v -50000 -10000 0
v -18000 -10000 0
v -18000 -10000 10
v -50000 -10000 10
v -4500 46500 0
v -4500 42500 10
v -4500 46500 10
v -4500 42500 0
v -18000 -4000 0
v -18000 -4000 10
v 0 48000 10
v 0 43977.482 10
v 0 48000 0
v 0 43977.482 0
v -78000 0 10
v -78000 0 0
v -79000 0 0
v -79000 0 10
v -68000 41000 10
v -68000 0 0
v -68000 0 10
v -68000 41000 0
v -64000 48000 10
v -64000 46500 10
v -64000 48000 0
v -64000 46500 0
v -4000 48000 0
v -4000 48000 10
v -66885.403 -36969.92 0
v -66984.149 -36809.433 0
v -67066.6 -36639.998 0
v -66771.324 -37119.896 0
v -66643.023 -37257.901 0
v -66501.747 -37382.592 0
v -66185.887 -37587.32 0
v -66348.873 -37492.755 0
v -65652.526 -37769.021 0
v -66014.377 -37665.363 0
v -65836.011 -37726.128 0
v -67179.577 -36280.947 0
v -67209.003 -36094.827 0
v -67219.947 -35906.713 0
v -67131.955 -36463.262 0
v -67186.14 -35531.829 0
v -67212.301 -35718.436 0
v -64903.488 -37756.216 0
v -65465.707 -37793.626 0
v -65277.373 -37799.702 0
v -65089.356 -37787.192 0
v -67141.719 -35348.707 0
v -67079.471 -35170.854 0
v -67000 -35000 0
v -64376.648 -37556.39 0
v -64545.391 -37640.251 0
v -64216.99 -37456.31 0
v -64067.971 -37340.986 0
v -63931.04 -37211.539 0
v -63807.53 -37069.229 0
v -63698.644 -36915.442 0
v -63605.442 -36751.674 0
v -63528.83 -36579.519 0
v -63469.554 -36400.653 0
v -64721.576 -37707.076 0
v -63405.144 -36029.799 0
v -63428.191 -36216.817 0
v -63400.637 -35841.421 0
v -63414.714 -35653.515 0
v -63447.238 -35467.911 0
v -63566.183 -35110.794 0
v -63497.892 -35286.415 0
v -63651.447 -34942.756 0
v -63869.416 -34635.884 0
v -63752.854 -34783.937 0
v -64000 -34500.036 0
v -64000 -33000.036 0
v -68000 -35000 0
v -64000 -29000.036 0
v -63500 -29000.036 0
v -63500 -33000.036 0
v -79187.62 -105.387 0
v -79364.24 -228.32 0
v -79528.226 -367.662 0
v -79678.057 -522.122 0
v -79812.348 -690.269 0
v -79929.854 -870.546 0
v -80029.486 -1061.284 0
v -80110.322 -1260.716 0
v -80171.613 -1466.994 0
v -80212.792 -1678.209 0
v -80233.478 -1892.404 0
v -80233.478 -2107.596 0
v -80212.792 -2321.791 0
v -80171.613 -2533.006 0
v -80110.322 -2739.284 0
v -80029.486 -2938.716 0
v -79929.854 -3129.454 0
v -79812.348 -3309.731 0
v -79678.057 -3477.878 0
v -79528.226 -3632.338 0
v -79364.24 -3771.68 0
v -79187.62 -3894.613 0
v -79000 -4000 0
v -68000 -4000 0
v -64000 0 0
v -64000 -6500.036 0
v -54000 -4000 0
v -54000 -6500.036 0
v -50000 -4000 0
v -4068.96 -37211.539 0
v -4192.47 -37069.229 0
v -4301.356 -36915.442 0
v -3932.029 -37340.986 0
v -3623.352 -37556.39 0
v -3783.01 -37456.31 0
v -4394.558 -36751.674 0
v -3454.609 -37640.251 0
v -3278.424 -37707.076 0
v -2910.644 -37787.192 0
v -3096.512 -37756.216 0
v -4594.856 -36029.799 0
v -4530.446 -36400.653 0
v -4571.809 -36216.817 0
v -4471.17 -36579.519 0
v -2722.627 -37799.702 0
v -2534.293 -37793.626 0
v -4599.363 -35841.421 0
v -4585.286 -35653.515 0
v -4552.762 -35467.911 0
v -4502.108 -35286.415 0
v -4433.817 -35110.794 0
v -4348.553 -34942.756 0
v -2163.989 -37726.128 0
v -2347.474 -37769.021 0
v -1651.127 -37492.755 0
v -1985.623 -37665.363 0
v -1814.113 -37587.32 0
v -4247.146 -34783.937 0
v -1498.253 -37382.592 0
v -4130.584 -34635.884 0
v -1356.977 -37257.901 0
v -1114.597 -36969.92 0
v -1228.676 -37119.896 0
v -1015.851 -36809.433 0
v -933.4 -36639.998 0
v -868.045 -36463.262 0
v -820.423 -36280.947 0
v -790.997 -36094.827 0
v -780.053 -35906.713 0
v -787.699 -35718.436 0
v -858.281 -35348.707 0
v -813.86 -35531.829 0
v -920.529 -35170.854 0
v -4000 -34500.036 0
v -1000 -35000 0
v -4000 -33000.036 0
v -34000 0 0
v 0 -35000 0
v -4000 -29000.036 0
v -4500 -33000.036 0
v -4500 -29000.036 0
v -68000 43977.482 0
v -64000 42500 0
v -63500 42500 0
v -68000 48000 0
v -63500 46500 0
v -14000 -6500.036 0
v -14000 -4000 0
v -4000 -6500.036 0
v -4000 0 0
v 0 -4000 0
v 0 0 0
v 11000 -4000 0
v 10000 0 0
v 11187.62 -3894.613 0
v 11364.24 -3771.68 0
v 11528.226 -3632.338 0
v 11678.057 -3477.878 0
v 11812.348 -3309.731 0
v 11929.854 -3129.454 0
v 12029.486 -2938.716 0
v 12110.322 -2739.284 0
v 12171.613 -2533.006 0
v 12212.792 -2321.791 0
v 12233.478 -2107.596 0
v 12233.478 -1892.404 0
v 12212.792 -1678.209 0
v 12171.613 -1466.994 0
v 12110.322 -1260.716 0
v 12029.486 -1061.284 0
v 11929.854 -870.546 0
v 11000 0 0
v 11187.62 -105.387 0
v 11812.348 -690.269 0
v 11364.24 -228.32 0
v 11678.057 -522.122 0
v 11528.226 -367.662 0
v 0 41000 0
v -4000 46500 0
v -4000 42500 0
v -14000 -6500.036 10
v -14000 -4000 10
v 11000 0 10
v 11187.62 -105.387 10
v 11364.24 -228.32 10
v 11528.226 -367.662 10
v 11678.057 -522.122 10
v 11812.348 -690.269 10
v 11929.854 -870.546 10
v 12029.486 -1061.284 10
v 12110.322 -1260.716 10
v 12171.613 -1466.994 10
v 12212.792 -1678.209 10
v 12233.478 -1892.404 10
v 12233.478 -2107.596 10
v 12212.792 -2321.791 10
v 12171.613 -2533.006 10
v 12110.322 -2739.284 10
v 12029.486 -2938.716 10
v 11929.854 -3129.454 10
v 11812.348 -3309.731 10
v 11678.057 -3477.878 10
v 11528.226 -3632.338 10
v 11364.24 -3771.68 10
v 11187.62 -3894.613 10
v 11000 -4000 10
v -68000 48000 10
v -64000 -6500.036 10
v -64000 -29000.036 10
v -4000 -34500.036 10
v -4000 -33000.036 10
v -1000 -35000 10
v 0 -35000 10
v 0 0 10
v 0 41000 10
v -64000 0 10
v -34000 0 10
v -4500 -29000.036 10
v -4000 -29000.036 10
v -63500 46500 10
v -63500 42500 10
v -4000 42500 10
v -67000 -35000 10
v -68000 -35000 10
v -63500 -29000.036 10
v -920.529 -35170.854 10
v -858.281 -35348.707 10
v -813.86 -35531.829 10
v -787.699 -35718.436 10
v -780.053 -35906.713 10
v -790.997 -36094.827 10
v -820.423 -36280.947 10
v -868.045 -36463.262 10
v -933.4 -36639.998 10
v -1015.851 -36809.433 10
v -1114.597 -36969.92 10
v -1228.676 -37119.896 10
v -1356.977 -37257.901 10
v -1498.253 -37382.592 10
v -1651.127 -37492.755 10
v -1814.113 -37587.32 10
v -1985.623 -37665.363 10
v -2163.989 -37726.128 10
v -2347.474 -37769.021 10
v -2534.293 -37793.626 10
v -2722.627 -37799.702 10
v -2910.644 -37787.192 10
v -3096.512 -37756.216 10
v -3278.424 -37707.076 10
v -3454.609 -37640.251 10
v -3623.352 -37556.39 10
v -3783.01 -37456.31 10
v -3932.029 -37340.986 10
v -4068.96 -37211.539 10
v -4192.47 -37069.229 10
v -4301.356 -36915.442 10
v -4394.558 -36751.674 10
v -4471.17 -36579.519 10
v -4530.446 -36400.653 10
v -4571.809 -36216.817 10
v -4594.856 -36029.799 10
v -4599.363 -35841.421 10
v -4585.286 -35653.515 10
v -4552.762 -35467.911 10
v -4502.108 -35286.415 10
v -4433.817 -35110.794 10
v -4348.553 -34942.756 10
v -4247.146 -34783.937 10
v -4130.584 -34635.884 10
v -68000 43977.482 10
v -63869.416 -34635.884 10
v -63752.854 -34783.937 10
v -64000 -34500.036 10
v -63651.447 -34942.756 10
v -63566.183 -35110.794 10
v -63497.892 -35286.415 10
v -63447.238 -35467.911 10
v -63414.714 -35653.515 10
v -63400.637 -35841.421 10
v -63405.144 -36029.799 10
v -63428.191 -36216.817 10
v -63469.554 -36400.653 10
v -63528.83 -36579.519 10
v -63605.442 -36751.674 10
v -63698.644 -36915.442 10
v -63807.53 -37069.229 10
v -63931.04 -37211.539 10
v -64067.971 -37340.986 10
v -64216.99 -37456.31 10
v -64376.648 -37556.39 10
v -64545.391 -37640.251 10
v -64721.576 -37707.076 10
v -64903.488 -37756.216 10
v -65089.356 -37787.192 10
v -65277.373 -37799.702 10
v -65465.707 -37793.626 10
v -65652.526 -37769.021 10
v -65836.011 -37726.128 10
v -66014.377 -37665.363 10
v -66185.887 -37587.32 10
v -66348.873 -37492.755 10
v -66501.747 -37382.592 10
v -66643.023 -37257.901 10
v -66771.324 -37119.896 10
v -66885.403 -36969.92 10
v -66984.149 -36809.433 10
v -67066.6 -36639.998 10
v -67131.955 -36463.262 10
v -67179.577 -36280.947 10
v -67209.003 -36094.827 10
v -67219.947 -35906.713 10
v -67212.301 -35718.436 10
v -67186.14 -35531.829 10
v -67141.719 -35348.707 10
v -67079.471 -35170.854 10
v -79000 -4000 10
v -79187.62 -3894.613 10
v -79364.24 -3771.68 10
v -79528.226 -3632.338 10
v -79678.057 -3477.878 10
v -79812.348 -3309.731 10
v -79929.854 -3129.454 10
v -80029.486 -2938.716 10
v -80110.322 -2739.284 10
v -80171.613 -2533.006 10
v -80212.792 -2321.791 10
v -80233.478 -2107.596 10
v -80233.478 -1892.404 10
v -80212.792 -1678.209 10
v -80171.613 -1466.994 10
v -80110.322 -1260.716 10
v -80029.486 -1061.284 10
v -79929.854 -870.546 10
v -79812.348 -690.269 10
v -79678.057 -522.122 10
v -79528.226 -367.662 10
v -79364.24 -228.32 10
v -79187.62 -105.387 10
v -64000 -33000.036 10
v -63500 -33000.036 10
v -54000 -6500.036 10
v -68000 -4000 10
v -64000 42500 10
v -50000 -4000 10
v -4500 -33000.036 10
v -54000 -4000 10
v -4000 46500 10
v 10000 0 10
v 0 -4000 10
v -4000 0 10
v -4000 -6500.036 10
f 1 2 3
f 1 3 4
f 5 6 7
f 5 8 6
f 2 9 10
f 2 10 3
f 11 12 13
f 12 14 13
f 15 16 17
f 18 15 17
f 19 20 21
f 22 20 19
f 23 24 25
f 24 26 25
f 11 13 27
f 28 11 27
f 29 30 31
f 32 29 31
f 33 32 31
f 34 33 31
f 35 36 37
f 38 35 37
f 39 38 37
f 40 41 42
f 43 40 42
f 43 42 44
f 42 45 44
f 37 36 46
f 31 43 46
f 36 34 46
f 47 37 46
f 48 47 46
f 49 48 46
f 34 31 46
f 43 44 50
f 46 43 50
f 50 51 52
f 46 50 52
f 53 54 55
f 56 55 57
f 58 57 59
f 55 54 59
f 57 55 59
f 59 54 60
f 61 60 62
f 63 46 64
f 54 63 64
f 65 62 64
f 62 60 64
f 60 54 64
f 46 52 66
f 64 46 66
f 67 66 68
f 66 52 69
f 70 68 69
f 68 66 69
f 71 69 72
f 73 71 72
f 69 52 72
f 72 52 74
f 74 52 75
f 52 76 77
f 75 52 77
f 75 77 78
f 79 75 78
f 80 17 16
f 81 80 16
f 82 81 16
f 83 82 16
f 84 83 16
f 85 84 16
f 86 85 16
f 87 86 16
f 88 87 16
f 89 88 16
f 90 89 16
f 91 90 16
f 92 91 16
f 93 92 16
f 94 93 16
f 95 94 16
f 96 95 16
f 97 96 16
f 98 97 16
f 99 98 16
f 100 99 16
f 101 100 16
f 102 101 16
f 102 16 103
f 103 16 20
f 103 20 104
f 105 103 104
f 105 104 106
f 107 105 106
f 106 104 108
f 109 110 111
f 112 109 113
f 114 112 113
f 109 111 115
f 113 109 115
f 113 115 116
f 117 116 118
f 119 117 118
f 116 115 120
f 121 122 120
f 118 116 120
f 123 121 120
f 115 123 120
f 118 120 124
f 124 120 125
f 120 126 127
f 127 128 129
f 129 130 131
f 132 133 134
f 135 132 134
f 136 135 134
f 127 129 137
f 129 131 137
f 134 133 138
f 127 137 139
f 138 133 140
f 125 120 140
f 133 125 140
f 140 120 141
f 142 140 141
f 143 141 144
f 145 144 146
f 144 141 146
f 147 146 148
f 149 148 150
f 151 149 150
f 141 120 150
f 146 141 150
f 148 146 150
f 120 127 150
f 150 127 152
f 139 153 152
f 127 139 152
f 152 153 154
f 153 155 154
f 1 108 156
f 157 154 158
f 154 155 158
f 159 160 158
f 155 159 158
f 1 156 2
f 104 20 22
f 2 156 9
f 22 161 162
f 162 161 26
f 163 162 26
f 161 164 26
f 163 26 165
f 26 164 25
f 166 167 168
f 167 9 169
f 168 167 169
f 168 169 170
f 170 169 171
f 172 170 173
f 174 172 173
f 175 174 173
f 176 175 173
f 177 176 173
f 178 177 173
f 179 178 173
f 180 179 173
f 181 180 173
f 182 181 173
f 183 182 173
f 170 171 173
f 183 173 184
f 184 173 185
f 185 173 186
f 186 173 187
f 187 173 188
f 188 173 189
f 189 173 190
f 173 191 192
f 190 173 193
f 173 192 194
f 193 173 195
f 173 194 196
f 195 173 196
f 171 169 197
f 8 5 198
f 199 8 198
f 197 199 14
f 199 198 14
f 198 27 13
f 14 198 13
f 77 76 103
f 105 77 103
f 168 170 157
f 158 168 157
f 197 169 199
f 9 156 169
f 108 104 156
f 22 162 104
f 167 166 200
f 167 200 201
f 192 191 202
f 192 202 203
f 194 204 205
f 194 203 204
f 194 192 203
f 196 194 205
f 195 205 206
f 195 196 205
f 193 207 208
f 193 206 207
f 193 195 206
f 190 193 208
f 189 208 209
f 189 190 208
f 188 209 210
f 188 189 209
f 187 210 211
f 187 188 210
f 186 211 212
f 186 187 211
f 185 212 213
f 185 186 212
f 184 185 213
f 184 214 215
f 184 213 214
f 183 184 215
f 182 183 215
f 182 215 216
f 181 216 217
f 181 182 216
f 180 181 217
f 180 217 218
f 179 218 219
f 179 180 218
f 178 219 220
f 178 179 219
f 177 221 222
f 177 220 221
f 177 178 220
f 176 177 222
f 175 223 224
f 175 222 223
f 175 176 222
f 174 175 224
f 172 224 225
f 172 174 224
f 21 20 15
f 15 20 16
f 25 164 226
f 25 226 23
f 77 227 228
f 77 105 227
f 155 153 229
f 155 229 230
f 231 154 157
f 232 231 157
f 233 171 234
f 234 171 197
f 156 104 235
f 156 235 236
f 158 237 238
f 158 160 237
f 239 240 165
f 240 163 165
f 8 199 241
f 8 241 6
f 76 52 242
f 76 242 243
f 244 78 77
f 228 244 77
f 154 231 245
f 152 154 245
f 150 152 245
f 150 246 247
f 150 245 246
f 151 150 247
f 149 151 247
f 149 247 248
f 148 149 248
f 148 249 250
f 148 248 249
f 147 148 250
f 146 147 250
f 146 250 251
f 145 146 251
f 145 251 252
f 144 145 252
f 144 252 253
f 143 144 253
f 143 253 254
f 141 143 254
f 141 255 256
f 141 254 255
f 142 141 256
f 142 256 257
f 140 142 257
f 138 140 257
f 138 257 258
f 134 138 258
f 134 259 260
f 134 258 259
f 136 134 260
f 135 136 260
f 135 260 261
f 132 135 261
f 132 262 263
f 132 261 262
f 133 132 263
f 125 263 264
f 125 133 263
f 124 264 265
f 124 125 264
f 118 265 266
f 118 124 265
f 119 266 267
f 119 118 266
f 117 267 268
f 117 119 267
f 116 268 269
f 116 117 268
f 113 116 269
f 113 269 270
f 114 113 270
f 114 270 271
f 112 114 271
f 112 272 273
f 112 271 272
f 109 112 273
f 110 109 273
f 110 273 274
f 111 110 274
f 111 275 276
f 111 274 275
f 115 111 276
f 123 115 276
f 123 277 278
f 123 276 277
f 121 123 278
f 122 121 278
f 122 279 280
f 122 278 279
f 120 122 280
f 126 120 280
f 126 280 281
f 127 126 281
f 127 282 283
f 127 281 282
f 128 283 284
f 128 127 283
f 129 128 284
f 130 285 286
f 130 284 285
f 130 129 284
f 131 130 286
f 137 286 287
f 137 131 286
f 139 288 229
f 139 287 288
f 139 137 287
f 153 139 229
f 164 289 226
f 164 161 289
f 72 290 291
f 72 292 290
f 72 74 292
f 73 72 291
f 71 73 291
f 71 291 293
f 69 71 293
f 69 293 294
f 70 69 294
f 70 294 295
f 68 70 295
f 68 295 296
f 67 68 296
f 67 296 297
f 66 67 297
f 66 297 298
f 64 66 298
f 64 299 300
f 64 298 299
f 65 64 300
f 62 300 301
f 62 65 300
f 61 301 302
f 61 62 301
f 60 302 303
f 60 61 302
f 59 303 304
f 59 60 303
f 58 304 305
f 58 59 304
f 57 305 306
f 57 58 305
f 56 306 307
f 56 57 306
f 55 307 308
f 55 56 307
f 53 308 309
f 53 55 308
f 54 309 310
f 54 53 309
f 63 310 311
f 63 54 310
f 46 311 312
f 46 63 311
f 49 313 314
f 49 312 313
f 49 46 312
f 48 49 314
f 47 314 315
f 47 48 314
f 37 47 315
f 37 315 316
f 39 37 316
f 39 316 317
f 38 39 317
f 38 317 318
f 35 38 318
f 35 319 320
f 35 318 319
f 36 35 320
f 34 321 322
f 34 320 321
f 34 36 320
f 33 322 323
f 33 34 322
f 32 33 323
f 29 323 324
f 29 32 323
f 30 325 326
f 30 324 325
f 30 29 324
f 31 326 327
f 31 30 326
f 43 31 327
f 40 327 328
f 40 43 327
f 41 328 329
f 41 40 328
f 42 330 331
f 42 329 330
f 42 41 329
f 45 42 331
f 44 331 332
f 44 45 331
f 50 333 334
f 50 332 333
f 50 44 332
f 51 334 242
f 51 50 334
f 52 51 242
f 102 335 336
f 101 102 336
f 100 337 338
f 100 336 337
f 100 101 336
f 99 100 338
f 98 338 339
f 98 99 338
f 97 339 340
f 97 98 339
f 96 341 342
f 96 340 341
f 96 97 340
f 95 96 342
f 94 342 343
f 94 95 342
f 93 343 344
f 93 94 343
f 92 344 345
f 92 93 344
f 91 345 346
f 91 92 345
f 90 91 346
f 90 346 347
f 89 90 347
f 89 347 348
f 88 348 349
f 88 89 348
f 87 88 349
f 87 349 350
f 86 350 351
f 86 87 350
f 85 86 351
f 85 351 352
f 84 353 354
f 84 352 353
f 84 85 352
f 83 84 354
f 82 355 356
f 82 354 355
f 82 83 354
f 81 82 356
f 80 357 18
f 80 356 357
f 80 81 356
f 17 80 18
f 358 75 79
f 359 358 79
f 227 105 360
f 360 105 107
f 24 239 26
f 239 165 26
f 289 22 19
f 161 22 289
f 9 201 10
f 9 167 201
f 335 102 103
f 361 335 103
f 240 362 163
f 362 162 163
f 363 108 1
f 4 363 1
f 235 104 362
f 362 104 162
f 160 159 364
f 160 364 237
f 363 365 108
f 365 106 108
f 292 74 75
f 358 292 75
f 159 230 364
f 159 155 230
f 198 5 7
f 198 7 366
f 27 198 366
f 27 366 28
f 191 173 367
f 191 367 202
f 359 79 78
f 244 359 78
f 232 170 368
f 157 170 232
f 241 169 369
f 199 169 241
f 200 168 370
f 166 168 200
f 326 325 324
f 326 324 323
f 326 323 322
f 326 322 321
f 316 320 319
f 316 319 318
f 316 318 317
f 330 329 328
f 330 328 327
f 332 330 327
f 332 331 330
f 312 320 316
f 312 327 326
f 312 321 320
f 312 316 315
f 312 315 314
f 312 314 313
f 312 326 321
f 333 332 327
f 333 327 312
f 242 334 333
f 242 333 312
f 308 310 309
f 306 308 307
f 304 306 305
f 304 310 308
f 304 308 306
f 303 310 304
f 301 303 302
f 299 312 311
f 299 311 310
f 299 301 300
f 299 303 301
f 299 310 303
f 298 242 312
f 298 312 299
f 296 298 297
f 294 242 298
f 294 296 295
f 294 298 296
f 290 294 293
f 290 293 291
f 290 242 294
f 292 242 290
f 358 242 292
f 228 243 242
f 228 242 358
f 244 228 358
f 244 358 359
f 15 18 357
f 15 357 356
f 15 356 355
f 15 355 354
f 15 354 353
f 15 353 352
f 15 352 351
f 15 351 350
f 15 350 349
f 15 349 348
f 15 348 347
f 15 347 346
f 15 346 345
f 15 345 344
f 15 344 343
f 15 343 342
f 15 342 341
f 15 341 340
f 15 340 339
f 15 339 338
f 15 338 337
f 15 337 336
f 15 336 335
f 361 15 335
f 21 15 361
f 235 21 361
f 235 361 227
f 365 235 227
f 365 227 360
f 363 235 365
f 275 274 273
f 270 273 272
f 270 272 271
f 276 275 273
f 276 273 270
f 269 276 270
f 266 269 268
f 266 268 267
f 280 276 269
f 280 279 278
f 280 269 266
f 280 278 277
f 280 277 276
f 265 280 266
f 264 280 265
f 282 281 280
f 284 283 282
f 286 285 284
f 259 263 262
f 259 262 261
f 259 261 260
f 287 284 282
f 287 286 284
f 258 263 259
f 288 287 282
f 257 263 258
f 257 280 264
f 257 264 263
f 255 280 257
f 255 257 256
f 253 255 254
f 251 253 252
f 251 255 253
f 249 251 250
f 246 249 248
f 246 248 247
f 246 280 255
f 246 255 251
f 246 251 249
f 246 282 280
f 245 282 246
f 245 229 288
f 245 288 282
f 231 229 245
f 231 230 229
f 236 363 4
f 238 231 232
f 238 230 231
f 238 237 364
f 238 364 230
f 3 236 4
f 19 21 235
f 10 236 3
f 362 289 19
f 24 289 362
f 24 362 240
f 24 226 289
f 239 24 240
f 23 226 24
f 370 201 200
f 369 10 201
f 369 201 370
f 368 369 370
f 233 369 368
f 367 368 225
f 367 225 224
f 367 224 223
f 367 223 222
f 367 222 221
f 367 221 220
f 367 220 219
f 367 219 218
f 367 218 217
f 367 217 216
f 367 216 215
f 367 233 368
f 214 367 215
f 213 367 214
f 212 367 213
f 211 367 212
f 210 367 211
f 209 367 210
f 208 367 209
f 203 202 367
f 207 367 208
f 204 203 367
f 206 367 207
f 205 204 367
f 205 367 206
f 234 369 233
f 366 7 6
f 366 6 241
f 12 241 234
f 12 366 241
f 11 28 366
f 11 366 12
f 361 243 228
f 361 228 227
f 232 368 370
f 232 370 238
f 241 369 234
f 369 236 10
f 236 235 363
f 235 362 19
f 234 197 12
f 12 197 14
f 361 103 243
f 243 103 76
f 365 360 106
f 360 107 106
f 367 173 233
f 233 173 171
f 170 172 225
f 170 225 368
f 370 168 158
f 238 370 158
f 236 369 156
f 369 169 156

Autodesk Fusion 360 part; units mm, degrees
sketch "スケッチ1" plane through (0, 0, 0) normal (0, 0, 1) x (1, 0, 0)
  line L0 (10000, 0) -> (11000, 0)
  line L1 (11000, -4000) -> (0, -4000)
  line L2 (-63500, -29000.036) -> (-64000, -29000.036)
  line L3 (-63500, 42500) -> (-63500, 46500)
  line L4 (-54000, -6500.036) -> (-54000, -4000)
  line L5 (-64000, -34500.036) -> (-64000, -33000.036)
  line L6 (-34000, 2000) -> (-34000, -2000)
  arc A0 (-79000, 0) -> (-79000, -4000) centre (-78000, -2000) ccw
  line L7 (-67000, -35000) -> (-68000, -35000)
  line L8 (-64000, -6500.036) -> (-64000, -29000.036)
  line L9 (-64000, 0) -> (-34000, 0)
  line L10 (-64000, 42500) -> (-63500, 42500)
  line L11 (0, 41000) -> (0, 43977.4822)
  line L12 (-4500, -33000.036) -> (-4500, -29000.036)
  arc A1 (-67000, -35000) -> (-64000, -34500.036) centre (-65310.0198, -35889.9814) ccw
  arc A2 (11000, -4000) -> (11000, 0) centre (10000, -2000) ccw
  line L13 (-79000, -4000) -> (-68000, -4000)
  line L14 (-68000, 41000) -> (-68000, 43977.4822)
  line L15 (11000, -4000) -> (0, -4000)
  line L16 (-1000, -35000) -> (0, -35000)
  line L17 (-64000, 0) -> (-64000, 42500)
  line L18 (-78000, 0) -> (-79000, 0)
  line L19 (-68000, 0) -> (-78000, 0)
  line L20 (-4000, 0) -> (-4000, 42500)
  line L21 (-64000, -6500.036) -> (-54000, -6500.036)
  line L22 (-14000, -6500.036) -> (-14000, -4000)
  line L23 (-68000, 0) -> (-68000, 41000)
  line L24 (-63500, -33000.036) -> (-63500, -29000.036)
  line L25 (-4000, 0) -> (-34000, 0)
  line L26 (-4000, -6500.036) -> (-14000, -6500.036)
  line L27 (-4000, -33000.036) -> (-4500, -33000.036)
  line L28 (-4000, 42500) -> (-4500, 42500)
  line L29 (-68000, -4000) -> (-68000, -35000)
  line L30 (11000, 0) -> (0, 0)
  line L31 (-64000, -33000.036) -> (-63500, -33000.036)
  line L32 (0, -4000) -> (0, -35000)
  line L33 (-4500, 46500) -> (-4000, 46500)
  line L34 (0, 0) -> (10000, 0)
  line L35 (-63500, 46500) -> (-64000, 46500)
  line L36 (-4000, -34500.036) -> (-4000, -33000.036)
  line L37 (-4000, -6500.036) -> (-4000, -29000.036)
  line L38 (-4500, -29000.036) -> (-4000, -29000.036)
  line L39 (-4500, 42500) -> (-4500, 46500)
  arc A3 (-4000, -34500.036) -> (-1000, -35000) centre (-2689.9802, -35889.9814) ccw
  line L40 (0, 0) -> (0, 41000)
  line L41 (-54000, -4000) -> (-50000, -4000)
  line L42 (-50000, -4000) -> (-50000, -10000)
  line L43 (-14000, -4000) -> (-18000, -4000)
  line L44 (-18000, -4000) -> (-18000, -10000)
  line L45 (-18000, -10000) -> (-50000, -10000)
  line L46 (-68000, 43977.4822) -> (-68000, 48000)
  line L47 (-64000, 46500) -> (-64000, 48000)
  line L48 (-4000, 46500) -> (-4000, 48000)
  line L49 (0, 43977.4822) -> (0, 48000)
  line L50 (0, 48000) -> (-4000, 48000)
  line L51 (-68000, 48000) -> (-64000, 48000)
  point P0 (-64000, 42500)
  point P1 (-64000, -6500.036)
  point P2 (-64000, 0)
  point P3 (-64000, -34500.036)
  point P4 (-68000, 0)
  point P5 (-64000, -35000)
  point P6 (-4000, 0)
  point P7 (-64000, 41000)
  point P8 (-4000, -35000)
  point P9 (-4000, 41000)
  point P10 (-4000, -6500.036)
  point P11 (-64000, 0)
  point P12 (-4000, 42500)
  point P13 (-4000, -34500.036)
extrude "押し出し1" add sketch "スケッチ1" along normal blind 10
